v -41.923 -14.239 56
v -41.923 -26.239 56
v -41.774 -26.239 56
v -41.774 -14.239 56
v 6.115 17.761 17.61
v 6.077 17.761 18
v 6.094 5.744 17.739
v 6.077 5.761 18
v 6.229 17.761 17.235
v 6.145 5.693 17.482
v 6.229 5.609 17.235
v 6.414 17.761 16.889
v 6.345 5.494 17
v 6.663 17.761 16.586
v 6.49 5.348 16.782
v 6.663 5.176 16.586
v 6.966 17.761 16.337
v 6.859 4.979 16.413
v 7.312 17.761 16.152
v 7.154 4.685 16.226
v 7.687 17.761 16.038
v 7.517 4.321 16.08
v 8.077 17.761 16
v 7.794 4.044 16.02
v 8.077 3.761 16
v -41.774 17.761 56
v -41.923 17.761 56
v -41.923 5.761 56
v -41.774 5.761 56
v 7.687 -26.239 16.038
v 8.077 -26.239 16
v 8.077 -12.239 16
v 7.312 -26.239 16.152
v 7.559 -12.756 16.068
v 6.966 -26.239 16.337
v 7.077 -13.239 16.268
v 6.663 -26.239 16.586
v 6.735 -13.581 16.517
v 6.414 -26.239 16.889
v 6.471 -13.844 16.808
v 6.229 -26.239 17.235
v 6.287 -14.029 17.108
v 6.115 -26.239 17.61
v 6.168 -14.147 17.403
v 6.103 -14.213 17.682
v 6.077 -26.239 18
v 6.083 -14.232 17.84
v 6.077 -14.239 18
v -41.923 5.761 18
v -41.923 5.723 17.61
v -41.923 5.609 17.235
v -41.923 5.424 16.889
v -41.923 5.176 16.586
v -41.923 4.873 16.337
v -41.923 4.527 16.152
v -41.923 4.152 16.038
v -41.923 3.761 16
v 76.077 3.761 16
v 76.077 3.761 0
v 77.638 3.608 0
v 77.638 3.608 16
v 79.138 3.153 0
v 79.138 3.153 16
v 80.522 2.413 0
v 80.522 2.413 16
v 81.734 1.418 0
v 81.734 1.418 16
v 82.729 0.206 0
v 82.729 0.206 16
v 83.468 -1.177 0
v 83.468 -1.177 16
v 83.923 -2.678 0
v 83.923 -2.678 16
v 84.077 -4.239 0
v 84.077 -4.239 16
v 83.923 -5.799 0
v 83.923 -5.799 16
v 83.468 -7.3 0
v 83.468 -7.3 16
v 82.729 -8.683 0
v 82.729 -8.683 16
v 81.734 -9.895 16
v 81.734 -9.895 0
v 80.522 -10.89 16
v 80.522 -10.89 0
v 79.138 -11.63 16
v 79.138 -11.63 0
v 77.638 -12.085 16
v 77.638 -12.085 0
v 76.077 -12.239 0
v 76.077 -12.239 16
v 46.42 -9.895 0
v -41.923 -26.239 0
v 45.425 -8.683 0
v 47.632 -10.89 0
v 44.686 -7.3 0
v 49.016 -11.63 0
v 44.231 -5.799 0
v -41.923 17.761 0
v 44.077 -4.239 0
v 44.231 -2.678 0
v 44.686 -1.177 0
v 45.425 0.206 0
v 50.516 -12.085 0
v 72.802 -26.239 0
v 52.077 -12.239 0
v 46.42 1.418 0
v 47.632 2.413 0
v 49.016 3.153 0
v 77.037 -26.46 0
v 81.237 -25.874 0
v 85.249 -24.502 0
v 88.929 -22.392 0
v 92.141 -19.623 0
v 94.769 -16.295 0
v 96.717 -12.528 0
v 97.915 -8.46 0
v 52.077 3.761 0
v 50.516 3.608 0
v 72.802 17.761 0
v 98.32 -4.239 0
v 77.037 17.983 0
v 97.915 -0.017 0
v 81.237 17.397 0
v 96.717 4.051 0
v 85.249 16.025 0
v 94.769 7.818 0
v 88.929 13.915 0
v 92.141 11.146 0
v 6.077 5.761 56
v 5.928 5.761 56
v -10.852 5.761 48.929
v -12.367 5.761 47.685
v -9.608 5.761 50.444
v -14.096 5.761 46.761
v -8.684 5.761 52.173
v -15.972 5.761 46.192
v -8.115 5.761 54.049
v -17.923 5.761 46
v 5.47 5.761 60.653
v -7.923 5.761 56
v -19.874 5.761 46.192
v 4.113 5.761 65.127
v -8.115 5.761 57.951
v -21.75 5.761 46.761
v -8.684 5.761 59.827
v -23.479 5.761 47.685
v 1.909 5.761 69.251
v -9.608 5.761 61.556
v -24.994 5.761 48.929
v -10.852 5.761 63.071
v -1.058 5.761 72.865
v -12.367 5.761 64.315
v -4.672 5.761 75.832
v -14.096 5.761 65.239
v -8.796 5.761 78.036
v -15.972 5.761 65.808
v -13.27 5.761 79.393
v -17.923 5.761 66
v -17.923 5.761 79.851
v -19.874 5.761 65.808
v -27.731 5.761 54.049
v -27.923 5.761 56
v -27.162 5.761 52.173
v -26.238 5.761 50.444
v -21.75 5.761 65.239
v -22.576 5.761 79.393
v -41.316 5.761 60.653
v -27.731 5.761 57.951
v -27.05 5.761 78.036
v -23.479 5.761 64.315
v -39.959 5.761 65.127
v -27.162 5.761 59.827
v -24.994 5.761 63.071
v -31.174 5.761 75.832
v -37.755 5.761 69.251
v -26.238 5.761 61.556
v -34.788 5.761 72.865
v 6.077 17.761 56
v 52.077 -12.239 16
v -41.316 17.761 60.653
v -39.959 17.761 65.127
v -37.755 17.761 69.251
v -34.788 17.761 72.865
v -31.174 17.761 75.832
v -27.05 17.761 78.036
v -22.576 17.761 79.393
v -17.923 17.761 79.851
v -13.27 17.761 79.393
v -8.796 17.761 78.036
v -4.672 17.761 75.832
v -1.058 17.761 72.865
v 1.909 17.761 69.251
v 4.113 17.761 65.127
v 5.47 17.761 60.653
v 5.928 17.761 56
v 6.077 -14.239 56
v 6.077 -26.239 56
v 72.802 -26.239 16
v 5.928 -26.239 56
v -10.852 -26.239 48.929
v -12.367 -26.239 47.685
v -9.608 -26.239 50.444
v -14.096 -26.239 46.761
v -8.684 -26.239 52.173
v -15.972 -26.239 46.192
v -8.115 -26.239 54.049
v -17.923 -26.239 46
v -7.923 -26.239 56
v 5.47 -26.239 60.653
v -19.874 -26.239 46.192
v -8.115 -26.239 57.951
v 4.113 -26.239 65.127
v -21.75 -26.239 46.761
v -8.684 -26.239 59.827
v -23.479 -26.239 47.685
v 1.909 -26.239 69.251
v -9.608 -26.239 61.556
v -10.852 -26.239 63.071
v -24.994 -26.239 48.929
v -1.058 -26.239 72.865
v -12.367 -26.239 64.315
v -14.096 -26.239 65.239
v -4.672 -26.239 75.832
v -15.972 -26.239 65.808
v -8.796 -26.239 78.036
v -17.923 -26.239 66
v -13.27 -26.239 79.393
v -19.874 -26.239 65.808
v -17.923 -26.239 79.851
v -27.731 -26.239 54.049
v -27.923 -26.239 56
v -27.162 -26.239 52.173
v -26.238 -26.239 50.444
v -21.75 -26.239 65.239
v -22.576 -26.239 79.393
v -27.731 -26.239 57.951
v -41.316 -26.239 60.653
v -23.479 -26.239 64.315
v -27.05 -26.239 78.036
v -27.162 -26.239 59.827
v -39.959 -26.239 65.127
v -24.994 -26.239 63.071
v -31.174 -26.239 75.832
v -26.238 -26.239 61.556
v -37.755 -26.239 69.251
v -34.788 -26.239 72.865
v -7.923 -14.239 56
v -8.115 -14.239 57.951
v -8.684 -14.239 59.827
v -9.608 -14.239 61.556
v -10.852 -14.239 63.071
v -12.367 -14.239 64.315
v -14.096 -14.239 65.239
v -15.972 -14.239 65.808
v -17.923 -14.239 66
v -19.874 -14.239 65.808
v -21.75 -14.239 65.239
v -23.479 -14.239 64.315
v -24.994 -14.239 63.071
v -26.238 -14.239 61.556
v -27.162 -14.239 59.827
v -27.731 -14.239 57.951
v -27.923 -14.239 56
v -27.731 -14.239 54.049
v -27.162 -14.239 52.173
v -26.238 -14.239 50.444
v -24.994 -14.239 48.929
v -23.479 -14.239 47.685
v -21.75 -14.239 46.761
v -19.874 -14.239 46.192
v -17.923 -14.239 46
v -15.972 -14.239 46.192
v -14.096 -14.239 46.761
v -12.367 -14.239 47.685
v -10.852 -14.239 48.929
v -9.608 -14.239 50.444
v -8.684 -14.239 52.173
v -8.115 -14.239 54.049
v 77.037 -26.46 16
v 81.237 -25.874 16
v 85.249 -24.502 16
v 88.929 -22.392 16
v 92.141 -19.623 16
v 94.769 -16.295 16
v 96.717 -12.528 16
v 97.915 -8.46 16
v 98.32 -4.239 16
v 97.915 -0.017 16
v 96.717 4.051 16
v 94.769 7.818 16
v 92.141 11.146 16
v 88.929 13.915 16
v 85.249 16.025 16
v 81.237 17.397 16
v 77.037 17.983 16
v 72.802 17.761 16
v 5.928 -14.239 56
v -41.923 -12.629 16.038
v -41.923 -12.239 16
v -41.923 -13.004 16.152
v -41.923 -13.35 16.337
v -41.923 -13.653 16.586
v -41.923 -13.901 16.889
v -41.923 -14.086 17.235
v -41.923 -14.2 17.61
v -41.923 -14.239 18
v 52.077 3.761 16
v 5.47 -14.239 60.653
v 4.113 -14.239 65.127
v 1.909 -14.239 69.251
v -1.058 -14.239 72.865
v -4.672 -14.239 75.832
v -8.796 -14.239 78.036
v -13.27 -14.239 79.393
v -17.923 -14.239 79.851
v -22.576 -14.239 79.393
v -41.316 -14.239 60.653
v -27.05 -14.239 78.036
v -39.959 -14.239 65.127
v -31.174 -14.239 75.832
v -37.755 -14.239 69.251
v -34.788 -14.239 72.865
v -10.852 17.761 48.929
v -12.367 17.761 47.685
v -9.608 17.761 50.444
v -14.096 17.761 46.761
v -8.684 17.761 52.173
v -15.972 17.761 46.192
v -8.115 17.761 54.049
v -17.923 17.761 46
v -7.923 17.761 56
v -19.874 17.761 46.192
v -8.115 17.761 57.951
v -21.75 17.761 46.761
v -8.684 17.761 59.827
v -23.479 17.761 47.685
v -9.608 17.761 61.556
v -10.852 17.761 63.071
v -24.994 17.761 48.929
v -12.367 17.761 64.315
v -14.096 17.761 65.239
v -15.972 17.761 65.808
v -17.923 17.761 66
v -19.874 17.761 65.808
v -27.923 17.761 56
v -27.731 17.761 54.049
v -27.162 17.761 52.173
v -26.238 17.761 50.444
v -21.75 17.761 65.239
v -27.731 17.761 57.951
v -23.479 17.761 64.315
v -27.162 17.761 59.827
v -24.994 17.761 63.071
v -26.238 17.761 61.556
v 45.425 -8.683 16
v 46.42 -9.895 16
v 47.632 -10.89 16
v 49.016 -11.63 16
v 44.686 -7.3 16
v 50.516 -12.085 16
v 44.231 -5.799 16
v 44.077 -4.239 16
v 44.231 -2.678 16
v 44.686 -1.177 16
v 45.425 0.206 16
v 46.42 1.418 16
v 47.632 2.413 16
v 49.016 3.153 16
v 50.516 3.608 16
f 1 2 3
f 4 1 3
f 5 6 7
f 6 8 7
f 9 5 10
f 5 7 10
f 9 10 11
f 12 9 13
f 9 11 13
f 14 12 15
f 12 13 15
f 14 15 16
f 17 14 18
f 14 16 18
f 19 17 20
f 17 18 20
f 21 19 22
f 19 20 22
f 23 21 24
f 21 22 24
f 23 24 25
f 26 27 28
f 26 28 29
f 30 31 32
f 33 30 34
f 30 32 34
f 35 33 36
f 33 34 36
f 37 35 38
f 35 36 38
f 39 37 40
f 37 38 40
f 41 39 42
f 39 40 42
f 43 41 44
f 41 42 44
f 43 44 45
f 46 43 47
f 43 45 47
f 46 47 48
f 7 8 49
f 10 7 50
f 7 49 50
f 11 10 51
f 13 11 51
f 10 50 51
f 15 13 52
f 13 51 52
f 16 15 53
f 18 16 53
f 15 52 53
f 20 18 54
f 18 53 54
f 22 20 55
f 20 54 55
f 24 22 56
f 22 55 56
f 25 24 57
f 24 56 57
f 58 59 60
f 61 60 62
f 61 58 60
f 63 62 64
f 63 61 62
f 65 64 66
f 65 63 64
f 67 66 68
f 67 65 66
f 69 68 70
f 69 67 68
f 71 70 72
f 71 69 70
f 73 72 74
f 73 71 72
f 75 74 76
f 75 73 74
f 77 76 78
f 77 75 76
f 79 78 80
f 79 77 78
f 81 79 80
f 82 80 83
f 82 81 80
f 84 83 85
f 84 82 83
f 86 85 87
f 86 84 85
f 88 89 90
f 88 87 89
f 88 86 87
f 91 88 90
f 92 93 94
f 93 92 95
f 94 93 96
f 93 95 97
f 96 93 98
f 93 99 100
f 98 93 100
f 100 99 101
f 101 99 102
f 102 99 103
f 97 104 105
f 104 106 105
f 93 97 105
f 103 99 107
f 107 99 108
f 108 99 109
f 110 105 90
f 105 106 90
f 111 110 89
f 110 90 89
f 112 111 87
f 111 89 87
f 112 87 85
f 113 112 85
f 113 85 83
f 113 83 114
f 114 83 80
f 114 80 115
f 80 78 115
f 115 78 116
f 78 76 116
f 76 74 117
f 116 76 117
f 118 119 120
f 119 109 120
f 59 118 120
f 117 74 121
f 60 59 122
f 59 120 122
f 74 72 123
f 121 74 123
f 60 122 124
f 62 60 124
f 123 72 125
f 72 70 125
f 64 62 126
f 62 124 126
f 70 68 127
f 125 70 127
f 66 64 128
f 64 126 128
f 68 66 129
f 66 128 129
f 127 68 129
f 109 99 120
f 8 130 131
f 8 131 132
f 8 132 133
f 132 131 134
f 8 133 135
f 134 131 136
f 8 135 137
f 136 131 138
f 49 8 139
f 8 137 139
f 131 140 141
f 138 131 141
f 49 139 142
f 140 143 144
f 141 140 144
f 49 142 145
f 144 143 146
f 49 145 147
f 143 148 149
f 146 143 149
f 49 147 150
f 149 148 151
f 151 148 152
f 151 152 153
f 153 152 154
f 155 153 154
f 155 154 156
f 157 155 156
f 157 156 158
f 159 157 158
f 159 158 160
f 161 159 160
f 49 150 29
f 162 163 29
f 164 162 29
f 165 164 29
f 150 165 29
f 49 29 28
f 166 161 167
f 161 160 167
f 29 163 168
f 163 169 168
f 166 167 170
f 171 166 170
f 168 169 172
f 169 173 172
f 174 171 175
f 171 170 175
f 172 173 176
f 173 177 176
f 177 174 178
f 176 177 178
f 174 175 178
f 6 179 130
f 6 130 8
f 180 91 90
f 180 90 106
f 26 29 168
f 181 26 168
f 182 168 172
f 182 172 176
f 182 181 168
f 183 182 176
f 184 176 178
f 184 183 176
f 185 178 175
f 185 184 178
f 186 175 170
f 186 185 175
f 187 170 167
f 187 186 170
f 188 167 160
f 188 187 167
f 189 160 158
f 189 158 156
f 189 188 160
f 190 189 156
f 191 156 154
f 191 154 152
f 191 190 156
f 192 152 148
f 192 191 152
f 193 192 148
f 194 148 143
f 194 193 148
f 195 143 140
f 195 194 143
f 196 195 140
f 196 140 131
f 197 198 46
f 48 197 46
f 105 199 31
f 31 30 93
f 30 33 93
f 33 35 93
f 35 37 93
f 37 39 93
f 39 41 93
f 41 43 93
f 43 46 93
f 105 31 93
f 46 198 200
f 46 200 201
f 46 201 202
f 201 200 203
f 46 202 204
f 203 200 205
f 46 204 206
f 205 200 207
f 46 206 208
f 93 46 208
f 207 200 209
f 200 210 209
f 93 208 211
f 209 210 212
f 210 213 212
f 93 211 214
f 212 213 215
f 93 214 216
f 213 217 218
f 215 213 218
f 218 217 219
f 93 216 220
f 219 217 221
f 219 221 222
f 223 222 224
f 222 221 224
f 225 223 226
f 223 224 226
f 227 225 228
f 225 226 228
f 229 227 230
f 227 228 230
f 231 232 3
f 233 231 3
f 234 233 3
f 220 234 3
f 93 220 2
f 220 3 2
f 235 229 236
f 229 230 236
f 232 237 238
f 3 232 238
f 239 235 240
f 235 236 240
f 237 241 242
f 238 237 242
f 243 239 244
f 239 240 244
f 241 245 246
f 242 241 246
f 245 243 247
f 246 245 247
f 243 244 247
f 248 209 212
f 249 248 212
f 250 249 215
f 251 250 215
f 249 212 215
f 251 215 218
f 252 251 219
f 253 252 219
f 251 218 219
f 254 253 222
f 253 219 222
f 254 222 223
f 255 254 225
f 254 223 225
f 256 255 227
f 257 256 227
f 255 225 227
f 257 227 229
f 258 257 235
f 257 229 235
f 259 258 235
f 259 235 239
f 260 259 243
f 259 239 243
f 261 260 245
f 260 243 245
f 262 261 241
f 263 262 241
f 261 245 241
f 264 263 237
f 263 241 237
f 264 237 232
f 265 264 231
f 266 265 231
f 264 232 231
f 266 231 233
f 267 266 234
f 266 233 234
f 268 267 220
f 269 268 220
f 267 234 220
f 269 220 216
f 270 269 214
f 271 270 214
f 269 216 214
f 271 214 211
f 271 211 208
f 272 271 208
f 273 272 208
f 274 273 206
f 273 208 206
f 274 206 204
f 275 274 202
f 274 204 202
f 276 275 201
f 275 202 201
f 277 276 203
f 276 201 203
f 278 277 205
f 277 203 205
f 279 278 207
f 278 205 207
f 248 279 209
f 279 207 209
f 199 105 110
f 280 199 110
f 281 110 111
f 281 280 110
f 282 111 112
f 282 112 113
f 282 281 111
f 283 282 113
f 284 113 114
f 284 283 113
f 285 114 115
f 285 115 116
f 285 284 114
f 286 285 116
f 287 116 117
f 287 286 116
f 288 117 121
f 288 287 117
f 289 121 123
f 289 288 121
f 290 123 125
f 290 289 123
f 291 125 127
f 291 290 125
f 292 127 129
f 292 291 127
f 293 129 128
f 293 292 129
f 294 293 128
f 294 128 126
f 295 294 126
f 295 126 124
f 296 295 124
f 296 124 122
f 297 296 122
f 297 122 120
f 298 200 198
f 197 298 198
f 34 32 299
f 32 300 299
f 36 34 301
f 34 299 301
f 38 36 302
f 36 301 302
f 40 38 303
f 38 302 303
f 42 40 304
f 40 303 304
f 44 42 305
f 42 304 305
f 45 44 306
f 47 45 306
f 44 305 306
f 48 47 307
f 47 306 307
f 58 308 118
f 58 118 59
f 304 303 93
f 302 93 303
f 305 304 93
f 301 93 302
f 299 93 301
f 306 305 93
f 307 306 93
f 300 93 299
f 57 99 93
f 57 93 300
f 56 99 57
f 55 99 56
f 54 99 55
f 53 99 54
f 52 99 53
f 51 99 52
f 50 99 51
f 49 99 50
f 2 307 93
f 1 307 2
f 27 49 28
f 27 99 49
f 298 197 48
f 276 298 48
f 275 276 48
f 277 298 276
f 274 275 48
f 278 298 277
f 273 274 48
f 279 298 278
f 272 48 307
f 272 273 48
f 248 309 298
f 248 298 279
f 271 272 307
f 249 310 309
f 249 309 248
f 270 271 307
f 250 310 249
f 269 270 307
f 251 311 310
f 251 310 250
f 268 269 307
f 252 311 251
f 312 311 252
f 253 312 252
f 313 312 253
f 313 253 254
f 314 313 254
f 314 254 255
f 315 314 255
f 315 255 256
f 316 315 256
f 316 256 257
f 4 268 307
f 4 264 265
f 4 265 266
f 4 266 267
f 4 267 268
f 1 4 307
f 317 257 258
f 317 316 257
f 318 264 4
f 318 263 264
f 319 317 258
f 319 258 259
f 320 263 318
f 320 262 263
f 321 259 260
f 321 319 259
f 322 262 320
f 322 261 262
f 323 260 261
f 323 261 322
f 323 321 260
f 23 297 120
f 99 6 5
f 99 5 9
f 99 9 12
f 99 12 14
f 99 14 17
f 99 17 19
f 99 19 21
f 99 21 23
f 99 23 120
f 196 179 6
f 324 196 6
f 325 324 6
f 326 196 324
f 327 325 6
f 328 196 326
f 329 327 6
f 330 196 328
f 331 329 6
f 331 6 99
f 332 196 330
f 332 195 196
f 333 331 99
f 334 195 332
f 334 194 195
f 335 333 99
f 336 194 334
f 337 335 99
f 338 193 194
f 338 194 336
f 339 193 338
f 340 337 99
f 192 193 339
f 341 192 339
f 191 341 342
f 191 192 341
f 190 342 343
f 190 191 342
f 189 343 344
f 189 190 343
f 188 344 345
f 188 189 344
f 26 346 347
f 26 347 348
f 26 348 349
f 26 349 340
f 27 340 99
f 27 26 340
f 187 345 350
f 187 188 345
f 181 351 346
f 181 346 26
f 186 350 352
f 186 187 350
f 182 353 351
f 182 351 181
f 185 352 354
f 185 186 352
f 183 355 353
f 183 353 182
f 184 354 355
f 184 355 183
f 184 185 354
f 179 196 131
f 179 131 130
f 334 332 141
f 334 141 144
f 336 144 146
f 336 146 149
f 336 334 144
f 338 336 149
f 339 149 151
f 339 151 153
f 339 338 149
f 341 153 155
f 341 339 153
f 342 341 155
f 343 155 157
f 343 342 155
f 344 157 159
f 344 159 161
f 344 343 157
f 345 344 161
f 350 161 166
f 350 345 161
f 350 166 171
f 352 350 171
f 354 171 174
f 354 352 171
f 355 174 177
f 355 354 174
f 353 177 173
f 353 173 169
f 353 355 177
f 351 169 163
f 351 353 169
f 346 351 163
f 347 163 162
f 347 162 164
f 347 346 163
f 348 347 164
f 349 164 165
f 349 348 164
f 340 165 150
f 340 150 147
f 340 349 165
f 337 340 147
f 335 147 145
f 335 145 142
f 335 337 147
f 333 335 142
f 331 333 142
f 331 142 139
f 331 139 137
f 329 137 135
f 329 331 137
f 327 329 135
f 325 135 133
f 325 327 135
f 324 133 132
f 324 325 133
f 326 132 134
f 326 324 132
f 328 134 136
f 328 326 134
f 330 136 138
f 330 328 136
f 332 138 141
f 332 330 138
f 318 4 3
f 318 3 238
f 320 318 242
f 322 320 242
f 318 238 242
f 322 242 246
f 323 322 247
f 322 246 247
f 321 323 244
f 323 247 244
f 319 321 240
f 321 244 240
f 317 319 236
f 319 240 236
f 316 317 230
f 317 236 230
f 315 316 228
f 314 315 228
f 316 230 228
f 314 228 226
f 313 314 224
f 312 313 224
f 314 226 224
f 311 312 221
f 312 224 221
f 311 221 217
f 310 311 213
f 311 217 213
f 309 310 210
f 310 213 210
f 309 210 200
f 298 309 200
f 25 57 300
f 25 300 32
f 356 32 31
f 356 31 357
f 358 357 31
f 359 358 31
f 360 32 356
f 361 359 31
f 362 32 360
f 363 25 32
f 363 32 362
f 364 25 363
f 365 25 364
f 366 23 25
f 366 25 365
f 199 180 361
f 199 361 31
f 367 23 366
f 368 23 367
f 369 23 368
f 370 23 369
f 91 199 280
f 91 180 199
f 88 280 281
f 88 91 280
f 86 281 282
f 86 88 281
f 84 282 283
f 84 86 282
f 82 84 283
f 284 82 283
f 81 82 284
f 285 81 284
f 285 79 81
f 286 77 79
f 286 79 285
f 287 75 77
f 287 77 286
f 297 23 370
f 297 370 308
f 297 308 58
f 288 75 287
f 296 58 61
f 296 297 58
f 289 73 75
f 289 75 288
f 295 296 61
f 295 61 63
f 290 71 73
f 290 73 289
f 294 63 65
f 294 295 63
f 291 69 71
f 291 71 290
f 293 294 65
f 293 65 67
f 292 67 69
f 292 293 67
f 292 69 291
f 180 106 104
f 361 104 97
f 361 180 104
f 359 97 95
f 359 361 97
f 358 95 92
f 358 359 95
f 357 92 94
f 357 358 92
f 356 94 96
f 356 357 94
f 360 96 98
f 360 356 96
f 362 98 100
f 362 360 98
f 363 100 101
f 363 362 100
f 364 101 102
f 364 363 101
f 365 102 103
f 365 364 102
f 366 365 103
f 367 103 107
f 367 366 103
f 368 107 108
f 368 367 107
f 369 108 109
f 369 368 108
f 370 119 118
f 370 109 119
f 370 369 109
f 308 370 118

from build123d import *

# Parameters (mm, degrees)
SKETCH1_W           = 118
SKETCH1_H           = 44
BOSS_EXTRUDE1_DEPTH = 16
SKETCH2_R           = 22.242499638
BOSS_EXTRUDE2_DEPTH = 16
CUT_EXTRUDE1_DEPTH  = 17
SKETCH4_R           = 10
BOSS_EXTRUDE9_DEPTH = 12
FILLET1_R           = 2


with BuildPart() as part:
    # Sketch1 → Boss-Extrude1 (new body)
    with BuildSketch(Plane.XY):
        with Locations((17.077018634, -4.238509317)):
            Rectangle(SKETCH1_W, SKETCH1_H)
    extrude(amount=BOSS_EXTRUDE1_DEPTH)

    # Sketch2 → Boss-Extrude2 (add)
    with BuildSketch(Plane.XY.offset(16)):
        with Locations((76.077018634, -4.238509317)):
            Circle(SKETCH2_R)
    extrude(amount=-BOSS_EXTRUDE2_DEPTH)

    # Sketch3 → Cut-Extrude1 (cut, through all)
    with BuildSketch(Plane.XY.offset(16)):
        with BuildLine():
            Line((76.077018634, -12.238509317), (52.077018634, -12.238509317))
            ThreePointArc((52.077018634, -12.238509317), (44.077018634, -4.238509317), (52.077018634, 3.761490683))
            Line((52.077018634, 3.761490683), (76.077018634, 3.761490683))
            ThreePointArc((76.077018634, 3.761490683), (84.077018634, -4.238509317), (76.077018634, -12.238509317))
        make_face()
    extrude(amount=-CUT_EXTRUDE1_DEPTH, mode=Mode.SUBTRACT)

    # Sketch4 → Boss-Extrude9 (add)
    with BuildSketch(Plane.XZ.offset(26.238509317)):
        with BuildLine():
            Line((-41.922981366, 16), (-41.922981366, 56))
            Line((-41.922981366, 56), (-41.77422342, 56))
            ThreePointArc((-41.77422342, 56), (-17.922981366, 79.851242053), (5.928260687, 56))
            Line((5.928260687, 56), (6.077018634, 56))
            Line((6.077018634, 56), (6.077018634, 16))
            Line((6.077018634, 16), (-41.922981366, 16))
        make_face()
        with Locations((-17.922981366, 56)):
            Circle(SKETCH4_R, mode=Mode.SUBTRACT)
    boss_extrude9 = extrude(amount=-BOSS_EXTRUDE9_DEPTH)

    # Mirror14: Boss-Extrude9 across plane
    add(boss_extrude9.mirror(Plane.ZX.offset(-4.238509317)))

    # Fillet1
    fillet1_edges = [part.edges().sort_by_distance(p)[0] for p in [
        (6.077018634, -20.238509317, 16),
        (-17.922981366, -14.238509317, 16),
        (-17.922981366, 5.761490683, 16),
        (6.077018634, 11.761490683, 16),
    ]]
    fillet(fillet1_edges, radius=FILLET1_R)


solid = part.part
